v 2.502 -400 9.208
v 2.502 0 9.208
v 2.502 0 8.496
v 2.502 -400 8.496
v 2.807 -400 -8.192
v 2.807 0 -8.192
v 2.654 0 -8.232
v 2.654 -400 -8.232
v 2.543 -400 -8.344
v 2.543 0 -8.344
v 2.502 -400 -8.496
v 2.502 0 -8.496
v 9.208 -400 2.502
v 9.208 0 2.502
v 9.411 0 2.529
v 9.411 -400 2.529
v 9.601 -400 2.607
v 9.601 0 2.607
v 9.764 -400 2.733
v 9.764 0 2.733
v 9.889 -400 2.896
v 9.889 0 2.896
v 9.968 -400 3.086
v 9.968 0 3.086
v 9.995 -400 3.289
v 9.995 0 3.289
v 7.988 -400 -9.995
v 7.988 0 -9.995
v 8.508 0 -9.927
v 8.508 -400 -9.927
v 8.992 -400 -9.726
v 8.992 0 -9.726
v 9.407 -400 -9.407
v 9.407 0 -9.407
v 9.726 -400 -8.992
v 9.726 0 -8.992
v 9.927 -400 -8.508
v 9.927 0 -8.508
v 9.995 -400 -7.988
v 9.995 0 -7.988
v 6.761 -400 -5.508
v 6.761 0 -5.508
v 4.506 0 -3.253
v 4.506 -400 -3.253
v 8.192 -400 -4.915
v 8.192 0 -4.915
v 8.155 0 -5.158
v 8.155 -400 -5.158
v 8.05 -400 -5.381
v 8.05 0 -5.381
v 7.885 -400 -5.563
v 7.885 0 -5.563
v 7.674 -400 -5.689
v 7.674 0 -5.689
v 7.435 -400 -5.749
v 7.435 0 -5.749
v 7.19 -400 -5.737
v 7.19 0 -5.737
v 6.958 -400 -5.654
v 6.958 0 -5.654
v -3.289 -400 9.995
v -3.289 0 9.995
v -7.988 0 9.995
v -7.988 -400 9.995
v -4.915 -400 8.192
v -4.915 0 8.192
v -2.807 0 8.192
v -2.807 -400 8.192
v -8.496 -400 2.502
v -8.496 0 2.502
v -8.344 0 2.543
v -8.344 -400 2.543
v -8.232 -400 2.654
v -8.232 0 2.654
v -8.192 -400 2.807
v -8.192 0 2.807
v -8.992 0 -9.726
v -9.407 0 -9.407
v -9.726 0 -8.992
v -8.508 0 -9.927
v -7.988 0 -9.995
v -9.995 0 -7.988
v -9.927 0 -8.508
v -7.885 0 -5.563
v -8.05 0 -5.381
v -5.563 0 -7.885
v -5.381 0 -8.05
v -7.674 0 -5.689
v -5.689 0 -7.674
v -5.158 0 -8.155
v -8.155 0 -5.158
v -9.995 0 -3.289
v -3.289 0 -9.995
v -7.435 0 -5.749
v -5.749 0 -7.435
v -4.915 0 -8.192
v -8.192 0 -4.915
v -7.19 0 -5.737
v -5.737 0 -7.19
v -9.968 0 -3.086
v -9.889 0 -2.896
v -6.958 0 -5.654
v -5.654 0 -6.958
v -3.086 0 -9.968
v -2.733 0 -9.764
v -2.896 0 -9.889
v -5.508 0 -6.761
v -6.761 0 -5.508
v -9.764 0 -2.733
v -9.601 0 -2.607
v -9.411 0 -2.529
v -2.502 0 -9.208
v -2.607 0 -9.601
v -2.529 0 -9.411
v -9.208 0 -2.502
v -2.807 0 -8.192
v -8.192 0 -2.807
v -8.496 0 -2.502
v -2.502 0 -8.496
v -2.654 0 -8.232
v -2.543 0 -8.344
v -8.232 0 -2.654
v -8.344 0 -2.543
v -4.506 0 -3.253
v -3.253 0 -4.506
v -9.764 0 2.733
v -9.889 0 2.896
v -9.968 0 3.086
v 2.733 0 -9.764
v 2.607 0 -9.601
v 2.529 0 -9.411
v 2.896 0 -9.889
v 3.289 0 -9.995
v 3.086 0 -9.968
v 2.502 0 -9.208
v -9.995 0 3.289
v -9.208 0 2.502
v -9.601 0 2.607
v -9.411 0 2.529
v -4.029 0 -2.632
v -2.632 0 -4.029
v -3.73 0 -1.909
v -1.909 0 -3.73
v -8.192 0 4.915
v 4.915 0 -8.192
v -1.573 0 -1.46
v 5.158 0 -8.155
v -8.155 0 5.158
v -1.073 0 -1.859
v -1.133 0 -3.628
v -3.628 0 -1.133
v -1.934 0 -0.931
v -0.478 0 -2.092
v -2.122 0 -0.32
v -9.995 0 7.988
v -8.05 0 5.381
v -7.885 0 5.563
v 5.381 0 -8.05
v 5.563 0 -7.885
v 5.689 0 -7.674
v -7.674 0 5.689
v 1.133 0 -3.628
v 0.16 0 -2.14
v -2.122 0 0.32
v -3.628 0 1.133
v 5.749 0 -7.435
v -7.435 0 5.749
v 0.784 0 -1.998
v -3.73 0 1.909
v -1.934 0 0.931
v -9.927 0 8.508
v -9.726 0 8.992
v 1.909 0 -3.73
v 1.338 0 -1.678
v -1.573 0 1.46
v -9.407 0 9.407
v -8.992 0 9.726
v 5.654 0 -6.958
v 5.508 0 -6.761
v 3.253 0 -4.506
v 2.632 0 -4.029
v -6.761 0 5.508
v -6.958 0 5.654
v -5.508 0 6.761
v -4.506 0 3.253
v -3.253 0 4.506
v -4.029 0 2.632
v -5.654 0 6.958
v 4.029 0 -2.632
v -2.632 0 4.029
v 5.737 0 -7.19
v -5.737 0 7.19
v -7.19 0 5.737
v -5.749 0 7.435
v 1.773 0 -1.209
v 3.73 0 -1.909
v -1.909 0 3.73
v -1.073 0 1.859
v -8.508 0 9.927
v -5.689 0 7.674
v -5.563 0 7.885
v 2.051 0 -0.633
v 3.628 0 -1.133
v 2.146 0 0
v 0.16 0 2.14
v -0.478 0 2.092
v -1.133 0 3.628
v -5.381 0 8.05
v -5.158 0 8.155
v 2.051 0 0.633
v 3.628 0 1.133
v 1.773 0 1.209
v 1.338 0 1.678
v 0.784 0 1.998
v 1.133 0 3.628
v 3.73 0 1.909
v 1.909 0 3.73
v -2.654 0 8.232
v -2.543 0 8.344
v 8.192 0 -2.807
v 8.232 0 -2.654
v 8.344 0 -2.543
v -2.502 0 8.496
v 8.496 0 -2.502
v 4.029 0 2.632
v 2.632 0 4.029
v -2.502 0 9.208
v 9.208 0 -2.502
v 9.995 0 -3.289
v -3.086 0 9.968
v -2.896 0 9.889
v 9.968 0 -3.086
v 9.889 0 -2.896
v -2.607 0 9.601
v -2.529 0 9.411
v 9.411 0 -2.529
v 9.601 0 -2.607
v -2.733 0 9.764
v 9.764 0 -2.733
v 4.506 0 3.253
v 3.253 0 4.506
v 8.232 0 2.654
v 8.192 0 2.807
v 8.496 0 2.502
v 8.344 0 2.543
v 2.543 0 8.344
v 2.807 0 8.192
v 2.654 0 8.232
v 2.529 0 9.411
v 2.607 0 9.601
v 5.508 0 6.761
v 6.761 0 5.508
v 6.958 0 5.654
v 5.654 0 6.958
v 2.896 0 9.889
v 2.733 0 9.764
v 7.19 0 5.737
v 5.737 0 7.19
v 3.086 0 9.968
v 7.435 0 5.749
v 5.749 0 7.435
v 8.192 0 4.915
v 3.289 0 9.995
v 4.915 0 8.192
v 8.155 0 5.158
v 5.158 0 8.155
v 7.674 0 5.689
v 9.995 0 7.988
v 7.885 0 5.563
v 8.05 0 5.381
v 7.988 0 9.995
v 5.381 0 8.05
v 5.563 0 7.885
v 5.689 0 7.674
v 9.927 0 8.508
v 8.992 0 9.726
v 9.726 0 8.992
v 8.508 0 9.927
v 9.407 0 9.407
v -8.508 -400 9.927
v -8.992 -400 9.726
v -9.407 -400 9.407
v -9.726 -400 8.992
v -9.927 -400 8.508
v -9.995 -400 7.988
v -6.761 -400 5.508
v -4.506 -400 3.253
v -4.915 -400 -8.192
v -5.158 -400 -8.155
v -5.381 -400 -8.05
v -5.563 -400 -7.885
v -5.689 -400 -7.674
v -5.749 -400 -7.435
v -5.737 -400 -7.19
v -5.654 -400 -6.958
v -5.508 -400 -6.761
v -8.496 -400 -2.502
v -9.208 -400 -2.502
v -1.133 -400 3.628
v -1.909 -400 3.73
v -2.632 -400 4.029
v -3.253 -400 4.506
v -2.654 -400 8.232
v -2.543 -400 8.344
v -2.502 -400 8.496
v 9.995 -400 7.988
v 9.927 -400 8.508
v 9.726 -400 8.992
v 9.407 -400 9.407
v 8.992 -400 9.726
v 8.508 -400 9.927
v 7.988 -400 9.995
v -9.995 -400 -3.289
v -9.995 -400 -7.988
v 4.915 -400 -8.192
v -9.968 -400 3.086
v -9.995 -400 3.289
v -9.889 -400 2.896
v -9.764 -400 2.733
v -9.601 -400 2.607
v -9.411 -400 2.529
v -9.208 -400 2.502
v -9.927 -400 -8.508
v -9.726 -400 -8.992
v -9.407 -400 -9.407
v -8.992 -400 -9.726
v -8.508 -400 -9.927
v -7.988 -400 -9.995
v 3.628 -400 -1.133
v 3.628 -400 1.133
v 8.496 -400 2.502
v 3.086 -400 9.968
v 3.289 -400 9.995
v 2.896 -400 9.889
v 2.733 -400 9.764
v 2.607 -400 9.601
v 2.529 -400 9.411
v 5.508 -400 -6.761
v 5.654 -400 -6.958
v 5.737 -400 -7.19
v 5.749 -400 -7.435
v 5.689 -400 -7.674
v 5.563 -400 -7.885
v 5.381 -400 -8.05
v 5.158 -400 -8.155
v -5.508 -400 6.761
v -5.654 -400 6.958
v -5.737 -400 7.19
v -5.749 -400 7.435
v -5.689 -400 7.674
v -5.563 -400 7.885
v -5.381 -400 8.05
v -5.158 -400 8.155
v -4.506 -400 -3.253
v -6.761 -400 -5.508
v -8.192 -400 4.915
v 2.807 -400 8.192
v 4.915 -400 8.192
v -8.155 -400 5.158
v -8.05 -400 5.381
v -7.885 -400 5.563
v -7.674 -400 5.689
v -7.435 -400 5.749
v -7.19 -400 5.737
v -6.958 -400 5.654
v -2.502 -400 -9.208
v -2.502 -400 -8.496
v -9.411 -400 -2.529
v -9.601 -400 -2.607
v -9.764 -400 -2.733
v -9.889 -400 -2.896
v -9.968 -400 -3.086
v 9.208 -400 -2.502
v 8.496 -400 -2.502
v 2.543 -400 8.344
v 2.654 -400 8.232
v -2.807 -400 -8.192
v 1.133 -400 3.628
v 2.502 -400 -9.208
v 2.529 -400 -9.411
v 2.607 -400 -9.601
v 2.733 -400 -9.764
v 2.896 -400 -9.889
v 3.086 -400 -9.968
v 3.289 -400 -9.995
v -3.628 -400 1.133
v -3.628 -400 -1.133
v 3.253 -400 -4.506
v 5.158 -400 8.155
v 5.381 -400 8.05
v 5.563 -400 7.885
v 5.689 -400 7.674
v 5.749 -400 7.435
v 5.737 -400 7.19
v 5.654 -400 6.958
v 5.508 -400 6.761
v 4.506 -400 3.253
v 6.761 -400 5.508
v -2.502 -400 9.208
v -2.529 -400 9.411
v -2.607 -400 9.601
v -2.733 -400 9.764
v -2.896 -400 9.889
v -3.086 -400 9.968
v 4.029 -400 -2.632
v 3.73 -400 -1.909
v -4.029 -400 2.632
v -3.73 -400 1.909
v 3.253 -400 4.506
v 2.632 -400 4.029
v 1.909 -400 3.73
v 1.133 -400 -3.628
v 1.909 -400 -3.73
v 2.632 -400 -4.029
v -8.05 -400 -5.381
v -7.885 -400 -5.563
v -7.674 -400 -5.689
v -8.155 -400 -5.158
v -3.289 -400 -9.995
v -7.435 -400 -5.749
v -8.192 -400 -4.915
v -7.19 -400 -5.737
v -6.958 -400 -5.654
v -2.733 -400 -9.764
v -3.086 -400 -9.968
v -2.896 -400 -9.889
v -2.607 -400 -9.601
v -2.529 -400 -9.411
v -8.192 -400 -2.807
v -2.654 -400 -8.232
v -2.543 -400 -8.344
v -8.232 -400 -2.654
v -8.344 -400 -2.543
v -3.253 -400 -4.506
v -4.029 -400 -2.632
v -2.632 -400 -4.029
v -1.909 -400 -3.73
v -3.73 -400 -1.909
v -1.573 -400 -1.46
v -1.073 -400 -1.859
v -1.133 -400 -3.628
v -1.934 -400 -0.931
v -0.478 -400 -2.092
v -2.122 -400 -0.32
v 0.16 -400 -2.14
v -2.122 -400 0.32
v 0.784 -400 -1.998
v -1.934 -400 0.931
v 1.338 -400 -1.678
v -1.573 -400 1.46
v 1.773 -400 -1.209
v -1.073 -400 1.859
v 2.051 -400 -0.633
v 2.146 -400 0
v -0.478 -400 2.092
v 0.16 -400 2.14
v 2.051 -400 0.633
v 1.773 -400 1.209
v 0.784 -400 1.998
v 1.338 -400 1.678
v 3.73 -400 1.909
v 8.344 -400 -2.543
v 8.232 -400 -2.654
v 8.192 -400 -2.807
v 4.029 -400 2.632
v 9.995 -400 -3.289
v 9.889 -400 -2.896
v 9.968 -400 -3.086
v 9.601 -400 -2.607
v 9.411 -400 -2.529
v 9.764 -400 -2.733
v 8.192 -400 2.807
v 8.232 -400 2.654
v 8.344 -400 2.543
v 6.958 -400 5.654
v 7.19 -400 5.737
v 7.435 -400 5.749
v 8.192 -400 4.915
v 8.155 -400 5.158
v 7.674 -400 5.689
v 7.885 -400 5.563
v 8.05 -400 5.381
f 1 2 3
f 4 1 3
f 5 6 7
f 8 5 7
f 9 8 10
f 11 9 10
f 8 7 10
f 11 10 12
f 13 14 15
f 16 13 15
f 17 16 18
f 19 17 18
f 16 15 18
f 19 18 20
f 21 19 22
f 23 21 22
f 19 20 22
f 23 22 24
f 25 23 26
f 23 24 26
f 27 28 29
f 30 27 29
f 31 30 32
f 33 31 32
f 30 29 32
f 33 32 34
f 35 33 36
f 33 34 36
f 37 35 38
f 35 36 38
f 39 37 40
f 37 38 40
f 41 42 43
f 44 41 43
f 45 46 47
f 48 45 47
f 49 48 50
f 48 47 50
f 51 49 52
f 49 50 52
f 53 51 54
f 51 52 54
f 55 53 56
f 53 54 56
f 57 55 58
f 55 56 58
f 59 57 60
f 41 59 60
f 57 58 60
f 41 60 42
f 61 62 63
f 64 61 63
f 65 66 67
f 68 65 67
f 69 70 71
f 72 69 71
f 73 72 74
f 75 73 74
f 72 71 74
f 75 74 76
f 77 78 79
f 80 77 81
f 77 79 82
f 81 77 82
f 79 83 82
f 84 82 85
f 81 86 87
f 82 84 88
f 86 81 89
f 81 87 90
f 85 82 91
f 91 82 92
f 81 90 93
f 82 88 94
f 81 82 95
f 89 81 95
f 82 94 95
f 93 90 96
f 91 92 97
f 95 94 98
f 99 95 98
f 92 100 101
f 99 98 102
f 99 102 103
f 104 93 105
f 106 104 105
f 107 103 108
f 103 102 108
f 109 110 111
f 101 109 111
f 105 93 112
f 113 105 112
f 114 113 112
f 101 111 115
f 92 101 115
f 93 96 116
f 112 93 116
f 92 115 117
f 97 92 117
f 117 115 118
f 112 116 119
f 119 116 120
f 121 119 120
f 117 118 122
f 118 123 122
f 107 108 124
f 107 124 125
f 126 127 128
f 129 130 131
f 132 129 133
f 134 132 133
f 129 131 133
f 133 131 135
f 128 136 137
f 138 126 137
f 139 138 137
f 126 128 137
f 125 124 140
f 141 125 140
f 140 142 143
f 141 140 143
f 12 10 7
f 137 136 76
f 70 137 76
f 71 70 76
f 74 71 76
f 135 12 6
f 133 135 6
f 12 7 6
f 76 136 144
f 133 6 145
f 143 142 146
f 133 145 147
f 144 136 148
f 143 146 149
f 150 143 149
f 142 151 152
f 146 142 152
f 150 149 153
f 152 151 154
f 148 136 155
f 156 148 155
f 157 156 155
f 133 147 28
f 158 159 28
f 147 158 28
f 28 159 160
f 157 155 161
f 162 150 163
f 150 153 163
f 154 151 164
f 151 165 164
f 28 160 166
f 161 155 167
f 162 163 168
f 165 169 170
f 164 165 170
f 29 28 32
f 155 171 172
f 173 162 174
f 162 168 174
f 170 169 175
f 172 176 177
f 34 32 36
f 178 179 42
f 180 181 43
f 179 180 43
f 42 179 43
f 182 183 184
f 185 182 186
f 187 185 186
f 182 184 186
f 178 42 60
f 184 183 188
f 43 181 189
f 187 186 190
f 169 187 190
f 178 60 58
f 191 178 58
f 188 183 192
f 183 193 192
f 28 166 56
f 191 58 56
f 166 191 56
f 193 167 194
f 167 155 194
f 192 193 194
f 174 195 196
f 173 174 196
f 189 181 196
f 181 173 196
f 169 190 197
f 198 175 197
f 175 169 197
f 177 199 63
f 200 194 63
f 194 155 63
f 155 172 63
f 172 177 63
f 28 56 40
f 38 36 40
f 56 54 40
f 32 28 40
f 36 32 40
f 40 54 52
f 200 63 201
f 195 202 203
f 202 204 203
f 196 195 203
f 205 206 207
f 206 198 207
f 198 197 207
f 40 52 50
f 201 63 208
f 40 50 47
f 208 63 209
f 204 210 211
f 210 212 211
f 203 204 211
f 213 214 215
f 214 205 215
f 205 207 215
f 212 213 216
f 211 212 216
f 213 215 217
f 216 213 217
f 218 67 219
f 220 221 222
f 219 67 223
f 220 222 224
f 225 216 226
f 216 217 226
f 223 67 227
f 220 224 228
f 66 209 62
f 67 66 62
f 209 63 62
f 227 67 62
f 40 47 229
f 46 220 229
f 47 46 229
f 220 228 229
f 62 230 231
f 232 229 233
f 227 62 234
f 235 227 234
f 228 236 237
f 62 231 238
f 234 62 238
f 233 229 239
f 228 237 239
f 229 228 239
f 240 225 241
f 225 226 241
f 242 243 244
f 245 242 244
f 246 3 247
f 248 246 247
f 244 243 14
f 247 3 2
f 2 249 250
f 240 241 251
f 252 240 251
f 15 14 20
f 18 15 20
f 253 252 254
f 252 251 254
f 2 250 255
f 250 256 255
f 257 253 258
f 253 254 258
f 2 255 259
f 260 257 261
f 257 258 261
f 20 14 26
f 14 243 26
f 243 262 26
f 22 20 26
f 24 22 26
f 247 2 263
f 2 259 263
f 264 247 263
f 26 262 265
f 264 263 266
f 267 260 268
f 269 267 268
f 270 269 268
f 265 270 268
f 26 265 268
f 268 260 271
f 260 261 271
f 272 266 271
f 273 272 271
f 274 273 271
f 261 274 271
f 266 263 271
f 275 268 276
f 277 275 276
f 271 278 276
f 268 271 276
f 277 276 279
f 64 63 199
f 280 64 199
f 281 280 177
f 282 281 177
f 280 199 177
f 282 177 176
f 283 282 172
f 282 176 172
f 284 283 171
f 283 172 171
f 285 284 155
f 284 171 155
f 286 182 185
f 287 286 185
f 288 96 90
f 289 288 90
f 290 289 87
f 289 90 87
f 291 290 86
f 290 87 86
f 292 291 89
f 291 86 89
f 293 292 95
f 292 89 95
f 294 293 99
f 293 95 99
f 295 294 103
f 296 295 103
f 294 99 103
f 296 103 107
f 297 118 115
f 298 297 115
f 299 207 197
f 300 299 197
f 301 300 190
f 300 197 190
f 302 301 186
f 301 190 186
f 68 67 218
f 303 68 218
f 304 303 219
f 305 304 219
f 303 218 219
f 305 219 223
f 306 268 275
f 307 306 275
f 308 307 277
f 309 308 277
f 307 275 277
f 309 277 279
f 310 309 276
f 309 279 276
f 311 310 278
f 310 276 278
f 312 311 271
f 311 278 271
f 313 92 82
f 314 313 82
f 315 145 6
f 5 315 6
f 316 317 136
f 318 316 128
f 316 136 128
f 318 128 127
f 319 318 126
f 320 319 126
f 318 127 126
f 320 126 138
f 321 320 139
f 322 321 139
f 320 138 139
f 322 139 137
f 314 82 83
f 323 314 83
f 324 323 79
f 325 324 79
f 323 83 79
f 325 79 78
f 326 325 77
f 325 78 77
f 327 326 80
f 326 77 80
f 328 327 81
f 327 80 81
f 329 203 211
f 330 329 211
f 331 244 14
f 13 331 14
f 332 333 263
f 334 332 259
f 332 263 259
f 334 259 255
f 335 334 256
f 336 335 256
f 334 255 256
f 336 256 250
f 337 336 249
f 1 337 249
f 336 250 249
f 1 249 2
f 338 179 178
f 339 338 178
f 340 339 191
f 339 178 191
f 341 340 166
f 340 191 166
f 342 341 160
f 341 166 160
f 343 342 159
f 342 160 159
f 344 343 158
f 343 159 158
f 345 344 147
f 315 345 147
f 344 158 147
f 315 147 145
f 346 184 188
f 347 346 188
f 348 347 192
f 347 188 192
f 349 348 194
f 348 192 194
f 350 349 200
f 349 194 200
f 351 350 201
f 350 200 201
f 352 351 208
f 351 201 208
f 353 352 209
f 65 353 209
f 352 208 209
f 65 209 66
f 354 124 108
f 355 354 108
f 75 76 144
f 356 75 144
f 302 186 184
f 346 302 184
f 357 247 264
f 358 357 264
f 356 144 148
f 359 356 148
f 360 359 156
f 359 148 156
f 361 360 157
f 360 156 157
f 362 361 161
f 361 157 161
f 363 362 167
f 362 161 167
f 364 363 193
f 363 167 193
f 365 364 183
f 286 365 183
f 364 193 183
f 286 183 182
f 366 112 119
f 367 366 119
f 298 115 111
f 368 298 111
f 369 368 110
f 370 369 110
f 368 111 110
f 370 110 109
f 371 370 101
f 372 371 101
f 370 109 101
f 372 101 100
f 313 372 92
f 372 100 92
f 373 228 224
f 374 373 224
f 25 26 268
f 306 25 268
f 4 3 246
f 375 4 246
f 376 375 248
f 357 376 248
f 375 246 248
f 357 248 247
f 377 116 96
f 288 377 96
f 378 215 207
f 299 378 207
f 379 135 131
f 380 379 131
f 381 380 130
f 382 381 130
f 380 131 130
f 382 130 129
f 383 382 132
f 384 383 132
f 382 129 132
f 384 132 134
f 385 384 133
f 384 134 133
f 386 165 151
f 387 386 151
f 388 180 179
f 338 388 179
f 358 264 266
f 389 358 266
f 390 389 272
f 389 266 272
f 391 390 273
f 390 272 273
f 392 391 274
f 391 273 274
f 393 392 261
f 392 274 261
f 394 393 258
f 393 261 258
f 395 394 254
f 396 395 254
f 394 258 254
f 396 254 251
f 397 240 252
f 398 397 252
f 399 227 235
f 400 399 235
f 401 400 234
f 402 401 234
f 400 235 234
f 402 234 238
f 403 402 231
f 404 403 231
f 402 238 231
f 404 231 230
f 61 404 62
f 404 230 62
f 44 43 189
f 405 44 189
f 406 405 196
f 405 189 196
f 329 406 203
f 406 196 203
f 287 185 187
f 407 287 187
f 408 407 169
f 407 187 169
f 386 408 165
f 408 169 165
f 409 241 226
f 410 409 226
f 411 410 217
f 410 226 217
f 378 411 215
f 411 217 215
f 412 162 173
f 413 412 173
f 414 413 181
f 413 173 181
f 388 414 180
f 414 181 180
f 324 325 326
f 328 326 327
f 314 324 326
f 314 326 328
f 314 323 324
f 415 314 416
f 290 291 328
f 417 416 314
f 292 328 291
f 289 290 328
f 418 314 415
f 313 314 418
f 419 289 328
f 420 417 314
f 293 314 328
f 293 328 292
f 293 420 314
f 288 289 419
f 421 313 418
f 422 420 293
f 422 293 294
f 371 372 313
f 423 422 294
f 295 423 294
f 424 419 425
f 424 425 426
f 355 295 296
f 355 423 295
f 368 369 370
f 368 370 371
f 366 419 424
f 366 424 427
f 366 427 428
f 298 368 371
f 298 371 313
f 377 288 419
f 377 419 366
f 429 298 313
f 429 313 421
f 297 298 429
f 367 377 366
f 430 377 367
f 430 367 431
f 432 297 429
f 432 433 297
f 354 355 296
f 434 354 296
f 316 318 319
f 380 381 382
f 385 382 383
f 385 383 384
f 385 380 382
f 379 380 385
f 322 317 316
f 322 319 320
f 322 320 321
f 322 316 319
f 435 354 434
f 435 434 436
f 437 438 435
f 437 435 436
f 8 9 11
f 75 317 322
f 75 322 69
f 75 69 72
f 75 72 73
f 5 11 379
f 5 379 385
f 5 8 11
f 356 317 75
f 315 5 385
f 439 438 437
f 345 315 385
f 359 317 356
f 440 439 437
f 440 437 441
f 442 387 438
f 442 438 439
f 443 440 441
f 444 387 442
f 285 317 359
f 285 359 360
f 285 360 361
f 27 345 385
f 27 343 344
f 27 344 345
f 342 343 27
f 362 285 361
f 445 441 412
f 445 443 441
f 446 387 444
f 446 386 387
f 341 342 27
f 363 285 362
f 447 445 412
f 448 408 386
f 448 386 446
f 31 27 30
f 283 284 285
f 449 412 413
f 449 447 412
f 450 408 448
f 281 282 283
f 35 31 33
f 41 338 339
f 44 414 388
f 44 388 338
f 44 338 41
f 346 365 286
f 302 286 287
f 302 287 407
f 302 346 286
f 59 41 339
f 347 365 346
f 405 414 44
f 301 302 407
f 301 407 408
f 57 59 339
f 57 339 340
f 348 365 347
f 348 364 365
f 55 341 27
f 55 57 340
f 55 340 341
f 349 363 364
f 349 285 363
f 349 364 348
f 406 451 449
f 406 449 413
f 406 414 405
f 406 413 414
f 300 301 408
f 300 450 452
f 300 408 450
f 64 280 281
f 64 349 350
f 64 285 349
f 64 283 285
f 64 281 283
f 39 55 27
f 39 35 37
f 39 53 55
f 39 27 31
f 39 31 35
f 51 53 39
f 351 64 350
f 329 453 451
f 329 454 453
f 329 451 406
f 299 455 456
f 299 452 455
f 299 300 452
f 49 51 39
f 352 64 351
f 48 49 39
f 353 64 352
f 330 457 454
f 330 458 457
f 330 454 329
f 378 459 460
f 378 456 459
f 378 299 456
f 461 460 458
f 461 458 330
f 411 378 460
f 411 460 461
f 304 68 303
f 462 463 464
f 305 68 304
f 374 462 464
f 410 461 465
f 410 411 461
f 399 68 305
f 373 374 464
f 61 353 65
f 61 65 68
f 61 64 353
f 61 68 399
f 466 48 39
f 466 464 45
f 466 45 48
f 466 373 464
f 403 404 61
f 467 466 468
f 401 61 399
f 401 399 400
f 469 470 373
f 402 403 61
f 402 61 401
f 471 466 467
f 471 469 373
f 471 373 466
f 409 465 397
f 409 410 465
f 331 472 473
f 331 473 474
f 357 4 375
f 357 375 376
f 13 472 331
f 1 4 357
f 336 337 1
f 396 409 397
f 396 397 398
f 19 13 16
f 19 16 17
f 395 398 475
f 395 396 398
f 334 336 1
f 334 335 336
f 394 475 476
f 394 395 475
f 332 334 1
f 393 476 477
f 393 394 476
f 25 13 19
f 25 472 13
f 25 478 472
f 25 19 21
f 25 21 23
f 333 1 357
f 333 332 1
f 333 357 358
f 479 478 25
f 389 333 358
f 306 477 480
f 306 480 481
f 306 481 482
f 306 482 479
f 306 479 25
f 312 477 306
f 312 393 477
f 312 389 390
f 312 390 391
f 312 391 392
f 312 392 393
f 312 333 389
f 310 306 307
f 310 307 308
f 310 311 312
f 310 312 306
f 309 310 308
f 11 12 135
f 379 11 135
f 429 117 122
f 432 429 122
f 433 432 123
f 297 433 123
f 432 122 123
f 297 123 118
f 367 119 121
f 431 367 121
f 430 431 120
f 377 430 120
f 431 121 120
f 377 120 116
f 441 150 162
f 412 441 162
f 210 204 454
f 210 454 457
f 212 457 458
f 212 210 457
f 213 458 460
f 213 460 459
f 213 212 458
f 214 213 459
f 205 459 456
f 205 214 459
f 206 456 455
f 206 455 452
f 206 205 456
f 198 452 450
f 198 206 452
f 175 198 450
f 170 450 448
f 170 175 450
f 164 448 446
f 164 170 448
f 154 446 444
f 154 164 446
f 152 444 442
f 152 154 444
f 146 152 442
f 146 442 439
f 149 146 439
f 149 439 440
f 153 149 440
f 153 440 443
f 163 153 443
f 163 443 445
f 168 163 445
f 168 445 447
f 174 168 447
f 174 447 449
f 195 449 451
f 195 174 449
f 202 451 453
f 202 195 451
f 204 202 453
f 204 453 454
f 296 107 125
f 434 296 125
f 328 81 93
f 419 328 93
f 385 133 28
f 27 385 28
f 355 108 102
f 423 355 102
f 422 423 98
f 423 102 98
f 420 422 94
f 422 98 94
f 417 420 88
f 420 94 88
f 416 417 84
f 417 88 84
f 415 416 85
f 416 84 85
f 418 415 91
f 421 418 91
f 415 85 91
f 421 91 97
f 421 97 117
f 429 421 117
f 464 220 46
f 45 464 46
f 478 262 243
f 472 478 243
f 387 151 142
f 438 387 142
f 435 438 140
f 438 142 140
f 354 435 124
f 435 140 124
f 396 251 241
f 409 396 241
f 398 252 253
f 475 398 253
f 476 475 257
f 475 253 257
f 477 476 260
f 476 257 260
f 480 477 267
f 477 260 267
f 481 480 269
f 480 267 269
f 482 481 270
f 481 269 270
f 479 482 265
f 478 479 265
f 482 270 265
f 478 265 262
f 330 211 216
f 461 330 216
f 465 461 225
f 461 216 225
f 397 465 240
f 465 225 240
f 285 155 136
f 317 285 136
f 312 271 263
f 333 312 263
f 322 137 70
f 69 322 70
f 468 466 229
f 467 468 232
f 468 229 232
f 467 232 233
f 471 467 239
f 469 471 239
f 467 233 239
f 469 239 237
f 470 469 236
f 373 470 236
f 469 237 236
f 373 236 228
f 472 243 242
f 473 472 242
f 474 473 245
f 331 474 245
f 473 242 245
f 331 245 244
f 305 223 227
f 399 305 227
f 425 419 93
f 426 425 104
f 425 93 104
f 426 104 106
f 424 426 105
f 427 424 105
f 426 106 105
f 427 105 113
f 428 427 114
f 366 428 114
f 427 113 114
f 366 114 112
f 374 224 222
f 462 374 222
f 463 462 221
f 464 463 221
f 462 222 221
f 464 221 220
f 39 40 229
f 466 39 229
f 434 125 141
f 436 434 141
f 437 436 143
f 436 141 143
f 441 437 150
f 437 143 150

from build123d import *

# Parameters (mm, degrees)
F0_R     = 2.1463
F1_DEPTH = 400


with BuildPart() as f1:
    # F0 (on Front) → F1 (new body)
    with BuildSketch(Plane.XZ):
        with BuildLine():
            Line((-3.2893, 9.9949), (-7.9883, 9.9949))
            ThreePointArc((-7.9883, 9.9949), (-9.40718, 9.40718), (-9.9949, 7.9883))
            Line((-9.9949, 7.9883), (-9.9949, 3.2893))
            ThreePointArc((-9.9949, 3.2893), (-9.764276, 2.732524), (-9.2075, 2.5019))
            Line((-9.2075, 2.5019), (-8.4963, 2.5019))
            ThreePointArc((-8.4963, 2.5019), (-8.280774, 2.591174), (-8.1915, 2.8067))
            Line((-8.1915, 2.8067), (-8.1915, 4.9149))
            ThreePointArc((-8.1915, 4.9149), (-7.674065, 5.689296), (-6.760603, 5.507597))
            Line((-6.760603, 5.507597), (-4.505766, 3.25276))
            ThreePointArc((-4.505766, 3.25276), (-3.856054, 2.280398), (-3.627906, 1.133419))
            Line((-3.627906, 1.133419), (-3.627906, -1.133419))
            ThreePointArc((-3.627906, -1.133419), (-3.856054, -2.280398), (-4.505766, -3.25276))
            Line((-4.505766, -3.25276), (-6.760603, -5.507597))
            ThreePointArc((-6.760603, -5.507597), (-7.674065, -5.689296), (-8.1915, -4.9149))
            Line((-8.1915, -4.9149), (-8.1915, -2.8067))
            ThreePointArc((-8.1915, -2.8067), (-8.280774, -2.591174), (-8.4963, -2.5019))
            Line((-8.4963, -2.5019), (-9.2075, -2.5019))
            ThreePointArc((-9.2075, -2.5019), (-9.764276, -2.732524), (-9.9949, -3.2893))
            Line((-9.9949, -3.2893), (-9.9949, -7.9883))
            ThreePointArc((-9.9949, -7.9883), (-9.40718, -9.40718), (-7.9883, -9.9949))
            Line((-7.9883, -9.9949), (-3.2893, -9.9949))
            ThreePointArc((-3.2893, -9.9949), (-2.732524, -9.764276), (-2.5019, -9.2075))
            Line((-2.5019, -9.2075), (-2.5019, -8.4963))
            ThreePointArc((-2.5019, -8.4963), (-2.591174, -8.280774), (-2.8067, -8.1915))
            Line((-2.8067, -8.1915), (-4.9149, -8.1915))
            ThreePointArc((-4.9149, -8.1915), (-5.689296, -7.674065), (-5.507597, -6.760603))
            Line((-5.507597, -6.760603), (-3.25276, -4.505766))
            ThreePointArc((-3.25276, -4.505766), (-2.280398, -3.856054), (-1.133419, -3.627906))
            Line((-1.133419, -3.627906), (1.133419, -3.627906))
            ThreePointArc((1.133419, -3.627906), (2.280398, -3.856054), (3.25276, -4.505766))
            Line((3.25276, -4.505766), (5.507597, -6.760603))
            ThreePointArc((5.507597, -6.760603), (5.689296, -7.674065), (4.9149, -8.1915))
            Line((4.9149, -8.1915), (2.8067, -8.1915))
            ThreePointArc((2.8067, -8.1915), (2.591174, -8.280774), (2.5019, -8.4963))
            Line((2.5019, -8.4963), (2.5019, -9.2075))
            ThreePointArc((2.5019, -9.2075), (2.732524, -9.764276), (3.2893, -9.9949))
            Line((3.2893, -9.9949), (7.9883, -9.9949))
            ThreePointArc((7.9883, -9.9949), (9.40718, -9.40718), (9.9949, -7.9883))
            Line((9.9949, -7.9883), (9.9949, -3.2893))
            ThreePointArc((9.9949, -3.2893), (9.764276, -2.732524), (9.2075, -2.5019))
            Line((9.2075, -2.5019), (8.4963, -2.5019))
            ThreePointArc((8.4963, -2.5019), (8.280774, -2.591174), (8.1915, -2.8067))
            Line((8.1915, -2.8067), (8.1915, -4.9149))
            ThreePointArc((8.1915, -4.9149), (7.674065, -5.689296), (6.760603, -5.507597))
            Line((6.760603, -5.507597), (4.505766, -3.25276))
            ThreePointArc((4.505766, -3.25276), (3.856054, -2.280398), (3.627906, -1.133419))
            Line((3.627906, -1.133419), (3.627906, 1.133419))
            ThreePointArc((3.627906, 1.133419), (3.856054, 2.280398), (4.505766, 3.25276))
            Line((4.505766, 3.25276), (6.760603, 5.507597))
            ThreePointArc((6.760603, 5.507597), (7.674065, 5.689296), (8.1915, 4.9149))
            Line((8.1915, 4.9149), (8.1915, 2.8067))
            ThreePointArc((8.1915, 2.8067), (8.280774, 2.591174), (8.4963, 2.5019))
            Line((8.4963, 2.5019), (9.2075, 2.5019))
            ThreePointArc((9.2075, 2.5019), (9.764276, 2.732524), (9.9949, 3.2893))
            Line((9.9949, 3.2893), (9.9949, 7.9883))
            ThreePointArc((9.9949, 7.9883), (9.40718, 9.40718), (7.9883, 9.9949))
            Line((7.9883, 9.9949), (3.2893, 9.9949))
            ThreePointArc((3.2893, 9.9949), (2.732524, 9.764276), (2.5019, 9.2075))
            Line((2.5019, 9.2075), (2.5019, 8.4963))
            ThreePointArc((2.5019, 8.4963), (2.591174, 8.280774), (2.8067, 8.1915))
            Line((2.8067, 8.1915), (4.9149, 8.1915))
            ThreePointArc((4.9149, 8.1915), (5.689296, 7.674065), (5.507597, 6.760603))
            Line((5.507597, 6.760603), (3.25276, 4.505766))
            ThreePointArc((3.25276, 4.505766), (2.280398, 3.856054), (1.133419, 3.627906))
            Line((1.133419, 3.627906), (-1.133419, 3.627906))
            ThreePointArc((-1.133419, 3.627906), (-2.280398, 3.856054), (-3.25276, 4.505766))
            Line((-3.25276, 4.505766), (-5.507597, 6.760603))
            ThreePointArc((-5.507597, 6.760603), (-5.689296, 7.674065), (-4.9149, 8.1915))
            Line((-4.9149, 8.1915), (-2.8067, 8.1915))
            ThreePointArc((-2.8067, 8.1915), (-2.591174, 8.280774), (-2.5019, 8.4963))
            Line((-2.5019, 8.4963), (-2.5019, 9.2075))
            ThreePointArc((-2.5019, 9.2075), (-2.732524, 9.764276), (-3.2893, 9.9949))
        make_face()
        Circle(F0_R, mode=Mode.SUBTRACT)
    extrude(amount=F1_DEPTH)


solid = f1.part
